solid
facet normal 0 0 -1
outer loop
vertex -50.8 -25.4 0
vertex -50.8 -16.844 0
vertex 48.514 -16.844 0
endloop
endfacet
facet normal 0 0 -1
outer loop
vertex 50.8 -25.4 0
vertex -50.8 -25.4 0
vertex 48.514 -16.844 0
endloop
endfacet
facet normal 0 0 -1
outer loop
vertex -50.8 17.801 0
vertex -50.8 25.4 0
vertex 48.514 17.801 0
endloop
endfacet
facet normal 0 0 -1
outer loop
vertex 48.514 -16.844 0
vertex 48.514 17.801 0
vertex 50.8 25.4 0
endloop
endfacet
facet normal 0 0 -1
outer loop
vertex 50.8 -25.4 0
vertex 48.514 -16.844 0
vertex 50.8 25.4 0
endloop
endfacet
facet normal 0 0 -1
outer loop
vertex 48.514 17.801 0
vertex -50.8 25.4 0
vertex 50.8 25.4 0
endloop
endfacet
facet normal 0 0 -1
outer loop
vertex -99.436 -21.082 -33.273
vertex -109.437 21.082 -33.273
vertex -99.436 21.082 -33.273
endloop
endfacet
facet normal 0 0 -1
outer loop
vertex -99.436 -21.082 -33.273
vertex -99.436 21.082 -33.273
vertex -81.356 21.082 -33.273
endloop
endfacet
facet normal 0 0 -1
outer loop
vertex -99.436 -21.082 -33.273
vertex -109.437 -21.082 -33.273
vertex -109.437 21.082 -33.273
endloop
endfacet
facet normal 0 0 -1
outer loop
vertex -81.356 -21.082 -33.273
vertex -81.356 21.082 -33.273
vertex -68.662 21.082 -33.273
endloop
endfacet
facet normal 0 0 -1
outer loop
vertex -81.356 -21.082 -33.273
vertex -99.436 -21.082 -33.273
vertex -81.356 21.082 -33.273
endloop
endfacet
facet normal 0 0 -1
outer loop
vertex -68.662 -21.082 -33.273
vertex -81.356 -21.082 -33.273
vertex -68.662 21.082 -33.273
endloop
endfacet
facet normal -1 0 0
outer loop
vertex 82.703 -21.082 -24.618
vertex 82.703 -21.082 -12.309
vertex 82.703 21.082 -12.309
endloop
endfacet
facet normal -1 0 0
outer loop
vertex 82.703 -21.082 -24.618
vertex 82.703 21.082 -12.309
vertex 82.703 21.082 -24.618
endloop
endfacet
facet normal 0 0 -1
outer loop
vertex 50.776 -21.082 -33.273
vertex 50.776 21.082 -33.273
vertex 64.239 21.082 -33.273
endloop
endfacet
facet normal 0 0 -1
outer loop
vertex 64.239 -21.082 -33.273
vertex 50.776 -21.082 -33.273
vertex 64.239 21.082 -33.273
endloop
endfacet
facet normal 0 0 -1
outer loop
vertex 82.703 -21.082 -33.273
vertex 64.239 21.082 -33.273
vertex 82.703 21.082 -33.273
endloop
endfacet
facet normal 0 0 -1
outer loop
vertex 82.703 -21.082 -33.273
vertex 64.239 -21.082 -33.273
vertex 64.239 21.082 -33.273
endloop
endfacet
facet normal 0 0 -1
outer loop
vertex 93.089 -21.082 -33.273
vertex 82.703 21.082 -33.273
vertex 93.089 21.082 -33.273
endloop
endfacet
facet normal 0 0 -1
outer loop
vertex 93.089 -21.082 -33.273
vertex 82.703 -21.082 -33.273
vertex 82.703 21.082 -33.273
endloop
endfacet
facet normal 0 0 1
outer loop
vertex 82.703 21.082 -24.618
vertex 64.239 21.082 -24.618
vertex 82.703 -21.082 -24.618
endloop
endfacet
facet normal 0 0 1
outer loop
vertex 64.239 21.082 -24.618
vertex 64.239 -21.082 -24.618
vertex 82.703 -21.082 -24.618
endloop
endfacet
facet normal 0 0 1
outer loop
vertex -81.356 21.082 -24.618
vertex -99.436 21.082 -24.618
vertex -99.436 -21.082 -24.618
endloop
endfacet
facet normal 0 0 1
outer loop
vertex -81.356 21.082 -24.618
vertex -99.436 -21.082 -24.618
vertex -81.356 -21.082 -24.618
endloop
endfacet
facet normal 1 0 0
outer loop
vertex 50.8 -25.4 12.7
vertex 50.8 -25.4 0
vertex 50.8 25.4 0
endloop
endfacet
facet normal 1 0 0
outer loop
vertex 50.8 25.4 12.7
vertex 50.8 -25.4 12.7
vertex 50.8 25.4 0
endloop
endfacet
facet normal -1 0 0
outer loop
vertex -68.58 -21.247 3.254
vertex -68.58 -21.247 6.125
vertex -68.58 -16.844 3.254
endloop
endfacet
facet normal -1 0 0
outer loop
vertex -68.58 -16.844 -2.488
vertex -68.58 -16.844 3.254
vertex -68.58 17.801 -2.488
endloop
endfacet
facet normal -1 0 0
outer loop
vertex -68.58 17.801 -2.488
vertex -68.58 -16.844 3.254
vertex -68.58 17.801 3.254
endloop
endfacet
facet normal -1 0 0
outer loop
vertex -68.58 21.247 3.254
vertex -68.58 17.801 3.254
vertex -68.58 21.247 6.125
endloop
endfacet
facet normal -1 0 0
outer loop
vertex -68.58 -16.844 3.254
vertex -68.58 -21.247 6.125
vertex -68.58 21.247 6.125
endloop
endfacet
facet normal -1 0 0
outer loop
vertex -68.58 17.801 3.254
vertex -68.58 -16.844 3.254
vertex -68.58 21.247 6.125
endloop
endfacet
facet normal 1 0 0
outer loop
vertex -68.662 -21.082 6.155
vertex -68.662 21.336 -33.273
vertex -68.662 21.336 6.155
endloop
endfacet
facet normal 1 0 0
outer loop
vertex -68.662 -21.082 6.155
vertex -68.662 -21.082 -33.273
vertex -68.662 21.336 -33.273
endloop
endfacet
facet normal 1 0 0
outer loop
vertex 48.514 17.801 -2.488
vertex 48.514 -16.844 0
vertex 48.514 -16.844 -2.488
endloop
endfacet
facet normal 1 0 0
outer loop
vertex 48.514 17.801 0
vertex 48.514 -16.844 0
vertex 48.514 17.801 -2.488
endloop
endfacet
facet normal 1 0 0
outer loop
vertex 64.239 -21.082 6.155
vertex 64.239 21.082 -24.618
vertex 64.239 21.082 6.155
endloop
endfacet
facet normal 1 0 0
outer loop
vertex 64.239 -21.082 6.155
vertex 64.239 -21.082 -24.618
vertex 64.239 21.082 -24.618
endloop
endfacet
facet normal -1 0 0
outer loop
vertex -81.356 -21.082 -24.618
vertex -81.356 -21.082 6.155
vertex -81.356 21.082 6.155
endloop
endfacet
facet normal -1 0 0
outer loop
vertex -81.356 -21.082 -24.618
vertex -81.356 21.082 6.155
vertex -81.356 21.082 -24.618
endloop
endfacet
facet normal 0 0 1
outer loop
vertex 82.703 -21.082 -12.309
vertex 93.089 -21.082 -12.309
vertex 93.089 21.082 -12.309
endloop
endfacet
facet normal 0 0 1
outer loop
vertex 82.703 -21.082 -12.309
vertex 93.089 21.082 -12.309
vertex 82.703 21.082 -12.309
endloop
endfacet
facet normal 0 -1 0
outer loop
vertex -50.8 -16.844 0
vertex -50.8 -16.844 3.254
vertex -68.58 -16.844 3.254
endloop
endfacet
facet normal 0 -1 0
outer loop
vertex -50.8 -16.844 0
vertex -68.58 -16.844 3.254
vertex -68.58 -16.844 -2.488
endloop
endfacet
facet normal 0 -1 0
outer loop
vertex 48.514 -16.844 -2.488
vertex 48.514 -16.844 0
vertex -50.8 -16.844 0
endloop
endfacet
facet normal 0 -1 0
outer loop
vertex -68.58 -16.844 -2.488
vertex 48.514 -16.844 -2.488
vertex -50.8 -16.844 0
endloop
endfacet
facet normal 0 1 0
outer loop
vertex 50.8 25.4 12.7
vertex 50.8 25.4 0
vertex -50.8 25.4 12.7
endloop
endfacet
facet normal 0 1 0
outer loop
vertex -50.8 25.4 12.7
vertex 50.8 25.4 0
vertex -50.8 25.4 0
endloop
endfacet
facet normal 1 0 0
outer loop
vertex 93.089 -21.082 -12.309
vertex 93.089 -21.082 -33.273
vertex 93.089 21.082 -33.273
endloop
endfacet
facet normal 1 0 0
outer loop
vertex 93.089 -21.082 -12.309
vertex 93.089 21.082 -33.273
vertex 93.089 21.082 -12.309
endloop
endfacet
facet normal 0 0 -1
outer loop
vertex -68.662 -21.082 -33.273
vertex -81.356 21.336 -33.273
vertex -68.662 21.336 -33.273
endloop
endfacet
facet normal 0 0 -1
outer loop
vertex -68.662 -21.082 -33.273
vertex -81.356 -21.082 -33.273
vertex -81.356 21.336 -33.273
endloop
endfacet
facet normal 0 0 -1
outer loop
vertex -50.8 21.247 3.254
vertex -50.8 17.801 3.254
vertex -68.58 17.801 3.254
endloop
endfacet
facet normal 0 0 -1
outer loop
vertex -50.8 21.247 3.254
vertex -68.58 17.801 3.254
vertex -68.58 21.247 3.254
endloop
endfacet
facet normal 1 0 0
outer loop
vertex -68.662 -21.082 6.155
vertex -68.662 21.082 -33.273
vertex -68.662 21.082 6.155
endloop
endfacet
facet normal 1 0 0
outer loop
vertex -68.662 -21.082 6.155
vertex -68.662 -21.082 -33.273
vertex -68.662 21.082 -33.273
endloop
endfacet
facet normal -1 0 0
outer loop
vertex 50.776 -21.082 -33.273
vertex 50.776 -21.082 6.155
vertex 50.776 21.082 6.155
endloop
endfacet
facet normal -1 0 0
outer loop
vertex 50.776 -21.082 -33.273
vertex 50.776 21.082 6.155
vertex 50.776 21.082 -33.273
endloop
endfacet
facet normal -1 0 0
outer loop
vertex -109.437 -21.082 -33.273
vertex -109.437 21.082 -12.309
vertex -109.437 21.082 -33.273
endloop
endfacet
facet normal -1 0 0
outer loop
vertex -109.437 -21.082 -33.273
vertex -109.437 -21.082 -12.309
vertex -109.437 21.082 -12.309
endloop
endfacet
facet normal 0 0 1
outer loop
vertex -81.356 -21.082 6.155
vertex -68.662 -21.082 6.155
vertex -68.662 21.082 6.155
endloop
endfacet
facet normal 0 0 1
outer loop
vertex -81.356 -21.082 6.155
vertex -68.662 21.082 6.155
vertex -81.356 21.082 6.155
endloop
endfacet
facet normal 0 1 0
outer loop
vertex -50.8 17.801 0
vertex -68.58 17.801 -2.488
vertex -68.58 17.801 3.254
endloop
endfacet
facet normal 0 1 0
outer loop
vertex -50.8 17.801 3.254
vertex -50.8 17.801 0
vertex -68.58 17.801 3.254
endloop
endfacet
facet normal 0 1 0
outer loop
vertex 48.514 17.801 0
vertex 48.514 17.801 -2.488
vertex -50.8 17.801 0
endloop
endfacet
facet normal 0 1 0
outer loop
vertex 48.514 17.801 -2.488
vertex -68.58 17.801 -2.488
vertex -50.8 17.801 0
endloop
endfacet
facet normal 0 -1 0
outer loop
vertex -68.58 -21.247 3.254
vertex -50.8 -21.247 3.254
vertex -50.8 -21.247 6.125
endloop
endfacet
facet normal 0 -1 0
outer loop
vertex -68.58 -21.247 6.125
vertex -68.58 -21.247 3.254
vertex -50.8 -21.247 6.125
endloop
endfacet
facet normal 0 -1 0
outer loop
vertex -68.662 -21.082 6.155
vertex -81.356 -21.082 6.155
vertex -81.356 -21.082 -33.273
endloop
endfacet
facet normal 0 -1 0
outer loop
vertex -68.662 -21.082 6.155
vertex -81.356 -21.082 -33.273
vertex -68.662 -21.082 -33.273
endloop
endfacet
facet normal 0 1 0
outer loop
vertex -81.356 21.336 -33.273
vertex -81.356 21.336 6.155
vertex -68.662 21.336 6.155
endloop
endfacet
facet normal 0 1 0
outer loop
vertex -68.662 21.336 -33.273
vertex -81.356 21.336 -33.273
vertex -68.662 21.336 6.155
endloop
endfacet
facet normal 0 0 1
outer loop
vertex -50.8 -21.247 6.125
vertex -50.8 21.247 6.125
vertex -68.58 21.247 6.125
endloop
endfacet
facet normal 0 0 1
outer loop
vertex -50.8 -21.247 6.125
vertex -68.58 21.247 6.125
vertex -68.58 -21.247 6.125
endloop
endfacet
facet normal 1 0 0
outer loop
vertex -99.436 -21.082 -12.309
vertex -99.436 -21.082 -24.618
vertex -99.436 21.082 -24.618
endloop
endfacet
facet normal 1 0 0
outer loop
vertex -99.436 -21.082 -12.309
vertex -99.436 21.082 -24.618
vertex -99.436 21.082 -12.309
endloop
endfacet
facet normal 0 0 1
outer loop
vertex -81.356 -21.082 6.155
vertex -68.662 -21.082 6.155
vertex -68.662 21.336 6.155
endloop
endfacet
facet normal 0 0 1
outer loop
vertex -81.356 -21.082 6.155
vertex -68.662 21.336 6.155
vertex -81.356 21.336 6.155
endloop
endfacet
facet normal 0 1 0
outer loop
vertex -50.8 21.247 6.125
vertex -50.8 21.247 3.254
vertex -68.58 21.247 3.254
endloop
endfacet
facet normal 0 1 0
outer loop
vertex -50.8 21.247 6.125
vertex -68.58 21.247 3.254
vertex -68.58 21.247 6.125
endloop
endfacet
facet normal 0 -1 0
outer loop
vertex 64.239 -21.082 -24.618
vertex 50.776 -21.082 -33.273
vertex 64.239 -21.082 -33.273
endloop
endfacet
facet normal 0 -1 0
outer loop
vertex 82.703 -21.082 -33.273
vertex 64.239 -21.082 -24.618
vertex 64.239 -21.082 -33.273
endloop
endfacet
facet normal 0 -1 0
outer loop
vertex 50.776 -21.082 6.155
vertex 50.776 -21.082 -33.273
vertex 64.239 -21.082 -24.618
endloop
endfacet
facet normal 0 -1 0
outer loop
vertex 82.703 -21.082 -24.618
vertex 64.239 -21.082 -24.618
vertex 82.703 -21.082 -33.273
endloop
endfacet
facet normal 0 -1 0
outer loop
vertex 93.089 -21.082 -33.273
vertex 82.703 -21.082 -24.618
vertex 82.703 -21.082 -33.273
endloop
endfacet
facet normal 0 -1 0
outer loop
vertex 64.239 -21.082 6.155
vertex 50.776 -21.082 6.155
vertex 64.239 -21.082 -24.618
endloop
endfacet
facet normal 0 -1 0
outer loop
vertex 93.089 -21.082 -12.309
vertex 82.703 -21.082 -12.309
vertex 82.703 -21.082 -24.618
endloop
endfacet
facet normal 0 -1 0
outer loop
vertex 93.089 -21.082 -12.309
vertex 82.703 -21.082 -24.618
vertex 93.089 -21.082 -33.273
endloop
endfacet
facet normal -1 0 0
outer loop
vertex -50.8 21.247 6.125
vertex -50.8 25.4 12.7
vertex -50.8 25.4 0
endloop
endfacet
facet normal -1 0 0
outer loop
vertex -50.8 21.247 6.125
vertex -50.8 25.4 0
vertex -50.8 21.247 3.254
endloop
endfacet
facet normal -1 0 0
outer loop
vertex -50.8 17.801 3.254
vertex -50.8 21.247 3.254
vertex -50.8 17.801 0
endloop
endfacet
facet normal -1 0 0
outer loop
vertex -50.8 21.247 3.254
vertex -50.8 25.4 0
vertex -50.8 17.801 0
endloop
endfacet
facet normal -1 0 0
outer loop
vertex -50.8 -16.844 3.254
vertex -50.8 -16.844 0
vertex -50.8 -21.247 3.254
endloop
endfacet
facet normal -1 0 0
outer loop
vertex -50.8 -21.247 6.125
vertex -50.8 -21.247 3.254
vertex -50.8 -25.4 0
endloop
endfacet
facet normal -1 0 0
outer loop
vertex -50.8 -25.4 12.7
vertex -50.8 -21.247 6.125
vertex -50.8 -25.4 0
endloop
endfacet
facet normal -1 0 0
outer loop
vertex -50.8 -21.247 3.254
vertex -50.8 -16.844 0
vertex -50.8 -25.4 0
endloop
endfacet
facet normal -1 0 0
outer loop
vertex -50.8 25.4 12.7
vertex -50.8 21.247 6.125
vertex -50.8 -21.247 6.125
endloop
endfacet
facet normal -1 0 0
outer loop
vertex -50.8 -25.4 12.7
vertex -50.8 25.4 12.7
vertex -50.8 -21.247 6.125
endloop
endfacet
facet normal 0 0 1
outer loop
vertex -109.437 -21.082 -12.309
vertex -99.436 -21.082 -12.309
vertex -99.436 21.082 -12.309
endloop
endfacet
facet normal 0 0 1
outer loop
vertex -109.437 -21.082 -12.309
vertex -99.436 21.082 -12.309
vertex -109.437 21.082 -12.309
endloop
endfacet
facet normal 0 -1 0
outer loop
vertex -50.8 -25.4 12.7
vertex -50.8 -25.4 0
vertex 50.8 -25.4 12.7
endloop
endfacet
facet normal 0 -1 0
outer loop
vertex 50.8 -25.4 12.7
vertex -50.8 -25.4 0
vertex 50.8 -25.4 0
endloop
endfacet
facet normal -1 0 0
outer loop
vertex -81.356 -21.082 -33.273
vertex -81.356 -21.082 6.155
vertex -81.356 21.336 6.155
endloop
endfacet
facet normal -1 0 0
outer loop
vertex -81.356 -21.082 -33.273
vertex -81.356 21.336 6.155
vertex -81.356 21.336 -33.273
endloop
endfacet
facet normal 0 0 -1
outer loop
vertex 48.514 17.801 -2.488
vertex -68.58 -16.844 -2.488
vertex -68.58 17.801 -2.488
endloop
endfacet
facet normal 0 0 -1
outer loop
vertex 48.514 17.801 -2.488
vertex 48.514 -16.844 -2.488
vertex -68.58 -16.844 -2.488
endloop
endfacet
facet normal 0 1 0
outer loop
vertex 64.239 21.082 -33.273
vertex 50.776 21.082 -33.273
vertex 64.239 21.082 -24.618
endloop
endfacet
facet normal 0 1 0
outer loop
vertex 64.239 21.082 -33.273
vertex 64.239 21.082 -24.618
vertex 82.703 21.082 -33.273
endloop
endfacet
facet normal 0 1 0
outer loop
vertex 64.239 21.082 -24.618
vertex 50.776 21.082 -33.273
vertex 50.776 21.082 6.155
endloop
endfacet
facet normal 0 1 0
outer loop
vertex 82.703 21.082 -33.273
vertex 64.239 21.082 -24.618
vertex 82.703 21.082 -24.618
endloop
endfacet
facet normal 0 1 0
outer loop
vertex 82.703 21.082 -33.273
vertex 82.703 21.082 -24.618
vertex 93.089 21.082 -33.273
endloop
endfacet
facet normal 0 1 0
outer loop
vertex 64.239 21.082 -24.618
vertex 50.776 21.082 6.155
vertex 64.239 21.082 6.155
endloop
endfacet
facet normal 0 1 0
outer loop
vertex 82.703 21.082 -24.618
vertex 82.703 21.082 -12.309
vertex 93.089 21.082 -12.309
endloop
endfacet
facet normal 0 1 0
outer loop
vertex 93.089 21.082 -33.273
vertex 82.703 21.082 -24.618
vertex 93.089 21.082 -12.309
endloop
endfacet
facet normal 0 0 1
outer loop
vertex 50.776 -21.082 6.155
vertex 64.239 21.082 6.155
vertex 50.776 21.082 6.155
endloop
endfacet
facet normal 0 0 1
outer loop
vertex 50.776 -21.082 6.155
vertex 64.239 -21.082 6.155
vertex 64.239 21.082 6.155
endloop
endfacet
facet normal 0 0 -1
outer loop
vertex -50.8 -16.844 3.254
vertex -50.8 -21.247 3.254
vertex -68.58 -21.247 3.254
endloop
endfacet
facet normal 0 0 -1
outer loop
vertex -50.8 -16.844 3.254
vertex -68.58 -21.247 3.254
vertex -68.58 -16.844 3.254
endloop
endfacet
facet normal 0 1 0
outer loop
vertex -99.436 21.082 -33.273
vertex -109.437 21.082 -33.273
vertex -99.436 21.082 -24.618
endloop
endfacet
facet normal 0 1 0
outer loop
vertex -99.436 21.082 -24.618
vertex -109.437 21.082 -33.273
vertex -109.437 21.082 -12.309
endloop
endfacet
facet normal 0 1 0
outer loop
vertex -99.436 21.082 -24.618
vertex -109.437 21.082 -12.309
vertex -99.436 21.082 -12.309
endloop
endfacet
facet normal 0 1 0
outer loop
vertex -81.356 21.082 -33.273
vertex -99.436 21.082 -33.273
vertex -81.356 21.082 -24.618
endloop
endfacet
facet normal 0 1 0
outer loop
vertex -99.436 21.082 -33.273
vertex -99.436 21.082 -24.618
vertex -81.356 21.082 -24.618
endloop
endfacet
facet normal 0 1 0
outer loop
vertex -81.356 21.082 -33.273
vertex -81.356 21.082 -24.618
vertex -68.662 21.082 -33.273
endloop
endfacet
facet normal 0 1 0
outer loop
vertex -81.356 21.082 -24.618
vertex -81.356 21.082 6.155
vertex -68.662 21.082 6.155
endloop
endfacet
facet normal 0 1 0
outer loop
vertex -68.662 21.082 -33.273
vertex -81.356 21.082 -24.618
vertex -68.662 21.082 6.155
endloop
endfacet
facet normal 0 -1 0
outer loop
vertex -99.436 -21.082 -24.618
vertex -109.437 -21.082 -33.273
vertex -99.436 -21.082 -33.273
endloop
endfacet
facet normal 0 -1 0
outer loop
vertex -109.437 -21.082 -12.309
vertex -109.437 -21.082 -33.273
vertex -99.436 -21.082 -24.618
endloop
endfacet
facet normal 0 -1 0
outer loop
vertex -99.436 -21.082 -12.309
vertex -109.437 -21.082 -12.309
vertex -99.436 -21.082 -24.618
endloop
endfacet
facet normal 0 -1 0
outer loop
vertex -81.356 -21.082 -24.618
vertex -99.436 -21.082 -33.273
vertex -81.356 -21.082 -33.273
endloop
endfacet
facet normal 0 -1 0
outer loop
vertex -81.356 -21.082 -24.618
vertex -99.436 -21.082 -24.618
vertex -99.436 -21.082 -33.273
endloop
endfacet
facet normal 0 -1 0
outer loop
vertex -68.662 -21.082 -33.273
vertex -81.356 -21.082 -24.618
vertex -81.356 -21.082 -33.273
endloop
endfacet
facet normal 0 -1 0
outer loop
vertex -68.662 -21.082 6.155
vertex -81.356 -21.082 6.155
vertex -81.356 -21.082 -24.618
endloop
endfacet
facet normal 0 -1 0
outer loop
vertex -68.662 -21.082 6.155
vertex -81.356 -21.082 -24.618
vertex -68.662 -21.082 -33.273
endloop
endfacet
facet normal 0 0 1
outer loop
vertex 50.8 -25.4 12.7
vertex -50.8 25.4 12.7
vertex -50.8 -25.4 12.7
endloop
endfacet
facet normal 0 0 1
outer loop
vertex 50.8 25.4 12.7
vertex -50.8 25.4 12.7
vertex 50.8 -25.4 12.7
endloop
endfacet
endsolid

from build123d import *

# Parameters (mm, degrees)
F0_W          = 50.8
F0_H          = 25.4
F1_DEPTH      = 12.7
F2_W          = 4.4024642557
F2_H          = 2.8711722698
F2_W_2        = 0.95705688
F2_W_3        = 3.4454073757
F3_DEPTH      = 48.514
F3_DEPTH_BACK = 68.58
F5_DEPTH      = 21.082
F5_DEPTH_BACK = 21.336
F4_W          = 18.0791839957
F4_H          = 8.6549278349
F6_DEPTH      = 21.082
F6_DEPTH_BACK = 21.082
F4_W_2        = 18.4638425708


with BuildPart() as f1:
    # F0 (on Top) → F1 (new body)
    with BuildSketch(Plane.XY):
        with Locations((25.4, 12.7)):
            Rectangle(F0_W, F0_H)
        with Locations((-25.4, 12.7)):
            Rectangle(F0_W, F0_H)
        with Locations((25.4, -12.7)):
            Rectangle(F0_W, F0_H)
        with Locations((-25.4, -12.7)):
            Rectangle(F0_W, F0_H)
    extrude(amount=F1_DEPTH)

    # F2 (on Right) → F3 (join, two sides)
    with BuildSketch(Plane.YZ) as f3_sk:
        Polygon((-16.8442111462, 3.2539952081), (-16.8442111462, -2.4883493315), (17.8012680262, -2.4883493315), (17.8012680262, 3.2539952081), (16.8442111462, 3.2539952081), (16.8442111462, 6.1251674779), (-16.8442111462, 6.1251674779), align=None)
        with Locations((-19.0454432741, 4.689581343)):
            Rectangle(F2_W, F2_H)
        with Locations((17.3227395862, 4.689581343)):
            Rectangle(F2_W_2, F2_H)
        with Locations((19.5239717141, 4.689581343)):
            Rectangle(F2_W_3, F2_H)
    extrude(amount=F3_DEPTH)
    extrude(f3_sk.sketch, amount=-F3_DEPTH_BACK)


with BuildPart() as f5:
    # F4 (on Front) → F5 (new body, two sides)
    with BuildSketch(Plane.XZ) as f5_sk:
        Polygon((-68.6624273658, -33.2733914256), (-68.6624273658, 6.1546158977), (-81.3563242555, 6.1546158977), (-81.3563242555, -24.6184635907), (-81.3563242555, -33.2733914256), align=None)
    extrude(amount=F5_DEPTH)
    extrude(f5_sk.sketch, amount=-F5_DEPTH_BACK)


with BuildPart() as f6:
    # F4 (on Front) → F6 (new body, two sides)
    with BuildSketch(Plane.XZ) as f6_sk:
        Polygon((-68.6624273658, -33.2733914256), (-68.6624273658, 6.1546158977), (-81.3563242555, 6.1546158977), (-81.3563242555, -24.6184635907), (-81.3563242555, -33.2733914256), align=None)
        with Locations((-90.3959162533, -28.9459275082)):
            Rectangle(F4_W, F4_H)
        Polygon((-99.4355082512, -33.2733914256), (-99.4355082512, -24.6184635907), (-99.4355082512, -12.3092317954), (-109.4367578626, -12.3092317954), (-109.4367578626, -33.2733914256), align=None)
    extrude(amount=F6_DEPTH)
    extrude(f6_sk.sketch, amount=-F6_DEPTH_BACK)


with BuildPart() as f6b:
    # F4 (on Front) → F6, piece 2 (new body, two sides)
    with BuildSketch(Plane.XZ) as f6_2_sk:
        Polygon((64.2388015985, 6.1546158977), (50.7755801082, 6.1546158977), (50.7755801082, -33.2733914256), (64.2388015985, -33.2733914256), (64.2388015985, -24.6184635907), align=None)
        with Locations((73.4707228839, -28.9459275082)):
            Rectangle(F4_W_2, F4_H)
        Polygon((82.7026441693, -12.3092317954), (82.7026441693, -24.6184635907), (82.7026441693, -33.2733914256), (93.0885672569, -33.2733914256), (93.0885672569, -12.3092317954), align=None)
    extrude(amount=F6_DEPTH)
    extrude(f6_2_sk.sketch, amount=-F6_DEPTH_BACK)


solid = Compound([f1.part, f5.part, f6.part, f6b.part])
